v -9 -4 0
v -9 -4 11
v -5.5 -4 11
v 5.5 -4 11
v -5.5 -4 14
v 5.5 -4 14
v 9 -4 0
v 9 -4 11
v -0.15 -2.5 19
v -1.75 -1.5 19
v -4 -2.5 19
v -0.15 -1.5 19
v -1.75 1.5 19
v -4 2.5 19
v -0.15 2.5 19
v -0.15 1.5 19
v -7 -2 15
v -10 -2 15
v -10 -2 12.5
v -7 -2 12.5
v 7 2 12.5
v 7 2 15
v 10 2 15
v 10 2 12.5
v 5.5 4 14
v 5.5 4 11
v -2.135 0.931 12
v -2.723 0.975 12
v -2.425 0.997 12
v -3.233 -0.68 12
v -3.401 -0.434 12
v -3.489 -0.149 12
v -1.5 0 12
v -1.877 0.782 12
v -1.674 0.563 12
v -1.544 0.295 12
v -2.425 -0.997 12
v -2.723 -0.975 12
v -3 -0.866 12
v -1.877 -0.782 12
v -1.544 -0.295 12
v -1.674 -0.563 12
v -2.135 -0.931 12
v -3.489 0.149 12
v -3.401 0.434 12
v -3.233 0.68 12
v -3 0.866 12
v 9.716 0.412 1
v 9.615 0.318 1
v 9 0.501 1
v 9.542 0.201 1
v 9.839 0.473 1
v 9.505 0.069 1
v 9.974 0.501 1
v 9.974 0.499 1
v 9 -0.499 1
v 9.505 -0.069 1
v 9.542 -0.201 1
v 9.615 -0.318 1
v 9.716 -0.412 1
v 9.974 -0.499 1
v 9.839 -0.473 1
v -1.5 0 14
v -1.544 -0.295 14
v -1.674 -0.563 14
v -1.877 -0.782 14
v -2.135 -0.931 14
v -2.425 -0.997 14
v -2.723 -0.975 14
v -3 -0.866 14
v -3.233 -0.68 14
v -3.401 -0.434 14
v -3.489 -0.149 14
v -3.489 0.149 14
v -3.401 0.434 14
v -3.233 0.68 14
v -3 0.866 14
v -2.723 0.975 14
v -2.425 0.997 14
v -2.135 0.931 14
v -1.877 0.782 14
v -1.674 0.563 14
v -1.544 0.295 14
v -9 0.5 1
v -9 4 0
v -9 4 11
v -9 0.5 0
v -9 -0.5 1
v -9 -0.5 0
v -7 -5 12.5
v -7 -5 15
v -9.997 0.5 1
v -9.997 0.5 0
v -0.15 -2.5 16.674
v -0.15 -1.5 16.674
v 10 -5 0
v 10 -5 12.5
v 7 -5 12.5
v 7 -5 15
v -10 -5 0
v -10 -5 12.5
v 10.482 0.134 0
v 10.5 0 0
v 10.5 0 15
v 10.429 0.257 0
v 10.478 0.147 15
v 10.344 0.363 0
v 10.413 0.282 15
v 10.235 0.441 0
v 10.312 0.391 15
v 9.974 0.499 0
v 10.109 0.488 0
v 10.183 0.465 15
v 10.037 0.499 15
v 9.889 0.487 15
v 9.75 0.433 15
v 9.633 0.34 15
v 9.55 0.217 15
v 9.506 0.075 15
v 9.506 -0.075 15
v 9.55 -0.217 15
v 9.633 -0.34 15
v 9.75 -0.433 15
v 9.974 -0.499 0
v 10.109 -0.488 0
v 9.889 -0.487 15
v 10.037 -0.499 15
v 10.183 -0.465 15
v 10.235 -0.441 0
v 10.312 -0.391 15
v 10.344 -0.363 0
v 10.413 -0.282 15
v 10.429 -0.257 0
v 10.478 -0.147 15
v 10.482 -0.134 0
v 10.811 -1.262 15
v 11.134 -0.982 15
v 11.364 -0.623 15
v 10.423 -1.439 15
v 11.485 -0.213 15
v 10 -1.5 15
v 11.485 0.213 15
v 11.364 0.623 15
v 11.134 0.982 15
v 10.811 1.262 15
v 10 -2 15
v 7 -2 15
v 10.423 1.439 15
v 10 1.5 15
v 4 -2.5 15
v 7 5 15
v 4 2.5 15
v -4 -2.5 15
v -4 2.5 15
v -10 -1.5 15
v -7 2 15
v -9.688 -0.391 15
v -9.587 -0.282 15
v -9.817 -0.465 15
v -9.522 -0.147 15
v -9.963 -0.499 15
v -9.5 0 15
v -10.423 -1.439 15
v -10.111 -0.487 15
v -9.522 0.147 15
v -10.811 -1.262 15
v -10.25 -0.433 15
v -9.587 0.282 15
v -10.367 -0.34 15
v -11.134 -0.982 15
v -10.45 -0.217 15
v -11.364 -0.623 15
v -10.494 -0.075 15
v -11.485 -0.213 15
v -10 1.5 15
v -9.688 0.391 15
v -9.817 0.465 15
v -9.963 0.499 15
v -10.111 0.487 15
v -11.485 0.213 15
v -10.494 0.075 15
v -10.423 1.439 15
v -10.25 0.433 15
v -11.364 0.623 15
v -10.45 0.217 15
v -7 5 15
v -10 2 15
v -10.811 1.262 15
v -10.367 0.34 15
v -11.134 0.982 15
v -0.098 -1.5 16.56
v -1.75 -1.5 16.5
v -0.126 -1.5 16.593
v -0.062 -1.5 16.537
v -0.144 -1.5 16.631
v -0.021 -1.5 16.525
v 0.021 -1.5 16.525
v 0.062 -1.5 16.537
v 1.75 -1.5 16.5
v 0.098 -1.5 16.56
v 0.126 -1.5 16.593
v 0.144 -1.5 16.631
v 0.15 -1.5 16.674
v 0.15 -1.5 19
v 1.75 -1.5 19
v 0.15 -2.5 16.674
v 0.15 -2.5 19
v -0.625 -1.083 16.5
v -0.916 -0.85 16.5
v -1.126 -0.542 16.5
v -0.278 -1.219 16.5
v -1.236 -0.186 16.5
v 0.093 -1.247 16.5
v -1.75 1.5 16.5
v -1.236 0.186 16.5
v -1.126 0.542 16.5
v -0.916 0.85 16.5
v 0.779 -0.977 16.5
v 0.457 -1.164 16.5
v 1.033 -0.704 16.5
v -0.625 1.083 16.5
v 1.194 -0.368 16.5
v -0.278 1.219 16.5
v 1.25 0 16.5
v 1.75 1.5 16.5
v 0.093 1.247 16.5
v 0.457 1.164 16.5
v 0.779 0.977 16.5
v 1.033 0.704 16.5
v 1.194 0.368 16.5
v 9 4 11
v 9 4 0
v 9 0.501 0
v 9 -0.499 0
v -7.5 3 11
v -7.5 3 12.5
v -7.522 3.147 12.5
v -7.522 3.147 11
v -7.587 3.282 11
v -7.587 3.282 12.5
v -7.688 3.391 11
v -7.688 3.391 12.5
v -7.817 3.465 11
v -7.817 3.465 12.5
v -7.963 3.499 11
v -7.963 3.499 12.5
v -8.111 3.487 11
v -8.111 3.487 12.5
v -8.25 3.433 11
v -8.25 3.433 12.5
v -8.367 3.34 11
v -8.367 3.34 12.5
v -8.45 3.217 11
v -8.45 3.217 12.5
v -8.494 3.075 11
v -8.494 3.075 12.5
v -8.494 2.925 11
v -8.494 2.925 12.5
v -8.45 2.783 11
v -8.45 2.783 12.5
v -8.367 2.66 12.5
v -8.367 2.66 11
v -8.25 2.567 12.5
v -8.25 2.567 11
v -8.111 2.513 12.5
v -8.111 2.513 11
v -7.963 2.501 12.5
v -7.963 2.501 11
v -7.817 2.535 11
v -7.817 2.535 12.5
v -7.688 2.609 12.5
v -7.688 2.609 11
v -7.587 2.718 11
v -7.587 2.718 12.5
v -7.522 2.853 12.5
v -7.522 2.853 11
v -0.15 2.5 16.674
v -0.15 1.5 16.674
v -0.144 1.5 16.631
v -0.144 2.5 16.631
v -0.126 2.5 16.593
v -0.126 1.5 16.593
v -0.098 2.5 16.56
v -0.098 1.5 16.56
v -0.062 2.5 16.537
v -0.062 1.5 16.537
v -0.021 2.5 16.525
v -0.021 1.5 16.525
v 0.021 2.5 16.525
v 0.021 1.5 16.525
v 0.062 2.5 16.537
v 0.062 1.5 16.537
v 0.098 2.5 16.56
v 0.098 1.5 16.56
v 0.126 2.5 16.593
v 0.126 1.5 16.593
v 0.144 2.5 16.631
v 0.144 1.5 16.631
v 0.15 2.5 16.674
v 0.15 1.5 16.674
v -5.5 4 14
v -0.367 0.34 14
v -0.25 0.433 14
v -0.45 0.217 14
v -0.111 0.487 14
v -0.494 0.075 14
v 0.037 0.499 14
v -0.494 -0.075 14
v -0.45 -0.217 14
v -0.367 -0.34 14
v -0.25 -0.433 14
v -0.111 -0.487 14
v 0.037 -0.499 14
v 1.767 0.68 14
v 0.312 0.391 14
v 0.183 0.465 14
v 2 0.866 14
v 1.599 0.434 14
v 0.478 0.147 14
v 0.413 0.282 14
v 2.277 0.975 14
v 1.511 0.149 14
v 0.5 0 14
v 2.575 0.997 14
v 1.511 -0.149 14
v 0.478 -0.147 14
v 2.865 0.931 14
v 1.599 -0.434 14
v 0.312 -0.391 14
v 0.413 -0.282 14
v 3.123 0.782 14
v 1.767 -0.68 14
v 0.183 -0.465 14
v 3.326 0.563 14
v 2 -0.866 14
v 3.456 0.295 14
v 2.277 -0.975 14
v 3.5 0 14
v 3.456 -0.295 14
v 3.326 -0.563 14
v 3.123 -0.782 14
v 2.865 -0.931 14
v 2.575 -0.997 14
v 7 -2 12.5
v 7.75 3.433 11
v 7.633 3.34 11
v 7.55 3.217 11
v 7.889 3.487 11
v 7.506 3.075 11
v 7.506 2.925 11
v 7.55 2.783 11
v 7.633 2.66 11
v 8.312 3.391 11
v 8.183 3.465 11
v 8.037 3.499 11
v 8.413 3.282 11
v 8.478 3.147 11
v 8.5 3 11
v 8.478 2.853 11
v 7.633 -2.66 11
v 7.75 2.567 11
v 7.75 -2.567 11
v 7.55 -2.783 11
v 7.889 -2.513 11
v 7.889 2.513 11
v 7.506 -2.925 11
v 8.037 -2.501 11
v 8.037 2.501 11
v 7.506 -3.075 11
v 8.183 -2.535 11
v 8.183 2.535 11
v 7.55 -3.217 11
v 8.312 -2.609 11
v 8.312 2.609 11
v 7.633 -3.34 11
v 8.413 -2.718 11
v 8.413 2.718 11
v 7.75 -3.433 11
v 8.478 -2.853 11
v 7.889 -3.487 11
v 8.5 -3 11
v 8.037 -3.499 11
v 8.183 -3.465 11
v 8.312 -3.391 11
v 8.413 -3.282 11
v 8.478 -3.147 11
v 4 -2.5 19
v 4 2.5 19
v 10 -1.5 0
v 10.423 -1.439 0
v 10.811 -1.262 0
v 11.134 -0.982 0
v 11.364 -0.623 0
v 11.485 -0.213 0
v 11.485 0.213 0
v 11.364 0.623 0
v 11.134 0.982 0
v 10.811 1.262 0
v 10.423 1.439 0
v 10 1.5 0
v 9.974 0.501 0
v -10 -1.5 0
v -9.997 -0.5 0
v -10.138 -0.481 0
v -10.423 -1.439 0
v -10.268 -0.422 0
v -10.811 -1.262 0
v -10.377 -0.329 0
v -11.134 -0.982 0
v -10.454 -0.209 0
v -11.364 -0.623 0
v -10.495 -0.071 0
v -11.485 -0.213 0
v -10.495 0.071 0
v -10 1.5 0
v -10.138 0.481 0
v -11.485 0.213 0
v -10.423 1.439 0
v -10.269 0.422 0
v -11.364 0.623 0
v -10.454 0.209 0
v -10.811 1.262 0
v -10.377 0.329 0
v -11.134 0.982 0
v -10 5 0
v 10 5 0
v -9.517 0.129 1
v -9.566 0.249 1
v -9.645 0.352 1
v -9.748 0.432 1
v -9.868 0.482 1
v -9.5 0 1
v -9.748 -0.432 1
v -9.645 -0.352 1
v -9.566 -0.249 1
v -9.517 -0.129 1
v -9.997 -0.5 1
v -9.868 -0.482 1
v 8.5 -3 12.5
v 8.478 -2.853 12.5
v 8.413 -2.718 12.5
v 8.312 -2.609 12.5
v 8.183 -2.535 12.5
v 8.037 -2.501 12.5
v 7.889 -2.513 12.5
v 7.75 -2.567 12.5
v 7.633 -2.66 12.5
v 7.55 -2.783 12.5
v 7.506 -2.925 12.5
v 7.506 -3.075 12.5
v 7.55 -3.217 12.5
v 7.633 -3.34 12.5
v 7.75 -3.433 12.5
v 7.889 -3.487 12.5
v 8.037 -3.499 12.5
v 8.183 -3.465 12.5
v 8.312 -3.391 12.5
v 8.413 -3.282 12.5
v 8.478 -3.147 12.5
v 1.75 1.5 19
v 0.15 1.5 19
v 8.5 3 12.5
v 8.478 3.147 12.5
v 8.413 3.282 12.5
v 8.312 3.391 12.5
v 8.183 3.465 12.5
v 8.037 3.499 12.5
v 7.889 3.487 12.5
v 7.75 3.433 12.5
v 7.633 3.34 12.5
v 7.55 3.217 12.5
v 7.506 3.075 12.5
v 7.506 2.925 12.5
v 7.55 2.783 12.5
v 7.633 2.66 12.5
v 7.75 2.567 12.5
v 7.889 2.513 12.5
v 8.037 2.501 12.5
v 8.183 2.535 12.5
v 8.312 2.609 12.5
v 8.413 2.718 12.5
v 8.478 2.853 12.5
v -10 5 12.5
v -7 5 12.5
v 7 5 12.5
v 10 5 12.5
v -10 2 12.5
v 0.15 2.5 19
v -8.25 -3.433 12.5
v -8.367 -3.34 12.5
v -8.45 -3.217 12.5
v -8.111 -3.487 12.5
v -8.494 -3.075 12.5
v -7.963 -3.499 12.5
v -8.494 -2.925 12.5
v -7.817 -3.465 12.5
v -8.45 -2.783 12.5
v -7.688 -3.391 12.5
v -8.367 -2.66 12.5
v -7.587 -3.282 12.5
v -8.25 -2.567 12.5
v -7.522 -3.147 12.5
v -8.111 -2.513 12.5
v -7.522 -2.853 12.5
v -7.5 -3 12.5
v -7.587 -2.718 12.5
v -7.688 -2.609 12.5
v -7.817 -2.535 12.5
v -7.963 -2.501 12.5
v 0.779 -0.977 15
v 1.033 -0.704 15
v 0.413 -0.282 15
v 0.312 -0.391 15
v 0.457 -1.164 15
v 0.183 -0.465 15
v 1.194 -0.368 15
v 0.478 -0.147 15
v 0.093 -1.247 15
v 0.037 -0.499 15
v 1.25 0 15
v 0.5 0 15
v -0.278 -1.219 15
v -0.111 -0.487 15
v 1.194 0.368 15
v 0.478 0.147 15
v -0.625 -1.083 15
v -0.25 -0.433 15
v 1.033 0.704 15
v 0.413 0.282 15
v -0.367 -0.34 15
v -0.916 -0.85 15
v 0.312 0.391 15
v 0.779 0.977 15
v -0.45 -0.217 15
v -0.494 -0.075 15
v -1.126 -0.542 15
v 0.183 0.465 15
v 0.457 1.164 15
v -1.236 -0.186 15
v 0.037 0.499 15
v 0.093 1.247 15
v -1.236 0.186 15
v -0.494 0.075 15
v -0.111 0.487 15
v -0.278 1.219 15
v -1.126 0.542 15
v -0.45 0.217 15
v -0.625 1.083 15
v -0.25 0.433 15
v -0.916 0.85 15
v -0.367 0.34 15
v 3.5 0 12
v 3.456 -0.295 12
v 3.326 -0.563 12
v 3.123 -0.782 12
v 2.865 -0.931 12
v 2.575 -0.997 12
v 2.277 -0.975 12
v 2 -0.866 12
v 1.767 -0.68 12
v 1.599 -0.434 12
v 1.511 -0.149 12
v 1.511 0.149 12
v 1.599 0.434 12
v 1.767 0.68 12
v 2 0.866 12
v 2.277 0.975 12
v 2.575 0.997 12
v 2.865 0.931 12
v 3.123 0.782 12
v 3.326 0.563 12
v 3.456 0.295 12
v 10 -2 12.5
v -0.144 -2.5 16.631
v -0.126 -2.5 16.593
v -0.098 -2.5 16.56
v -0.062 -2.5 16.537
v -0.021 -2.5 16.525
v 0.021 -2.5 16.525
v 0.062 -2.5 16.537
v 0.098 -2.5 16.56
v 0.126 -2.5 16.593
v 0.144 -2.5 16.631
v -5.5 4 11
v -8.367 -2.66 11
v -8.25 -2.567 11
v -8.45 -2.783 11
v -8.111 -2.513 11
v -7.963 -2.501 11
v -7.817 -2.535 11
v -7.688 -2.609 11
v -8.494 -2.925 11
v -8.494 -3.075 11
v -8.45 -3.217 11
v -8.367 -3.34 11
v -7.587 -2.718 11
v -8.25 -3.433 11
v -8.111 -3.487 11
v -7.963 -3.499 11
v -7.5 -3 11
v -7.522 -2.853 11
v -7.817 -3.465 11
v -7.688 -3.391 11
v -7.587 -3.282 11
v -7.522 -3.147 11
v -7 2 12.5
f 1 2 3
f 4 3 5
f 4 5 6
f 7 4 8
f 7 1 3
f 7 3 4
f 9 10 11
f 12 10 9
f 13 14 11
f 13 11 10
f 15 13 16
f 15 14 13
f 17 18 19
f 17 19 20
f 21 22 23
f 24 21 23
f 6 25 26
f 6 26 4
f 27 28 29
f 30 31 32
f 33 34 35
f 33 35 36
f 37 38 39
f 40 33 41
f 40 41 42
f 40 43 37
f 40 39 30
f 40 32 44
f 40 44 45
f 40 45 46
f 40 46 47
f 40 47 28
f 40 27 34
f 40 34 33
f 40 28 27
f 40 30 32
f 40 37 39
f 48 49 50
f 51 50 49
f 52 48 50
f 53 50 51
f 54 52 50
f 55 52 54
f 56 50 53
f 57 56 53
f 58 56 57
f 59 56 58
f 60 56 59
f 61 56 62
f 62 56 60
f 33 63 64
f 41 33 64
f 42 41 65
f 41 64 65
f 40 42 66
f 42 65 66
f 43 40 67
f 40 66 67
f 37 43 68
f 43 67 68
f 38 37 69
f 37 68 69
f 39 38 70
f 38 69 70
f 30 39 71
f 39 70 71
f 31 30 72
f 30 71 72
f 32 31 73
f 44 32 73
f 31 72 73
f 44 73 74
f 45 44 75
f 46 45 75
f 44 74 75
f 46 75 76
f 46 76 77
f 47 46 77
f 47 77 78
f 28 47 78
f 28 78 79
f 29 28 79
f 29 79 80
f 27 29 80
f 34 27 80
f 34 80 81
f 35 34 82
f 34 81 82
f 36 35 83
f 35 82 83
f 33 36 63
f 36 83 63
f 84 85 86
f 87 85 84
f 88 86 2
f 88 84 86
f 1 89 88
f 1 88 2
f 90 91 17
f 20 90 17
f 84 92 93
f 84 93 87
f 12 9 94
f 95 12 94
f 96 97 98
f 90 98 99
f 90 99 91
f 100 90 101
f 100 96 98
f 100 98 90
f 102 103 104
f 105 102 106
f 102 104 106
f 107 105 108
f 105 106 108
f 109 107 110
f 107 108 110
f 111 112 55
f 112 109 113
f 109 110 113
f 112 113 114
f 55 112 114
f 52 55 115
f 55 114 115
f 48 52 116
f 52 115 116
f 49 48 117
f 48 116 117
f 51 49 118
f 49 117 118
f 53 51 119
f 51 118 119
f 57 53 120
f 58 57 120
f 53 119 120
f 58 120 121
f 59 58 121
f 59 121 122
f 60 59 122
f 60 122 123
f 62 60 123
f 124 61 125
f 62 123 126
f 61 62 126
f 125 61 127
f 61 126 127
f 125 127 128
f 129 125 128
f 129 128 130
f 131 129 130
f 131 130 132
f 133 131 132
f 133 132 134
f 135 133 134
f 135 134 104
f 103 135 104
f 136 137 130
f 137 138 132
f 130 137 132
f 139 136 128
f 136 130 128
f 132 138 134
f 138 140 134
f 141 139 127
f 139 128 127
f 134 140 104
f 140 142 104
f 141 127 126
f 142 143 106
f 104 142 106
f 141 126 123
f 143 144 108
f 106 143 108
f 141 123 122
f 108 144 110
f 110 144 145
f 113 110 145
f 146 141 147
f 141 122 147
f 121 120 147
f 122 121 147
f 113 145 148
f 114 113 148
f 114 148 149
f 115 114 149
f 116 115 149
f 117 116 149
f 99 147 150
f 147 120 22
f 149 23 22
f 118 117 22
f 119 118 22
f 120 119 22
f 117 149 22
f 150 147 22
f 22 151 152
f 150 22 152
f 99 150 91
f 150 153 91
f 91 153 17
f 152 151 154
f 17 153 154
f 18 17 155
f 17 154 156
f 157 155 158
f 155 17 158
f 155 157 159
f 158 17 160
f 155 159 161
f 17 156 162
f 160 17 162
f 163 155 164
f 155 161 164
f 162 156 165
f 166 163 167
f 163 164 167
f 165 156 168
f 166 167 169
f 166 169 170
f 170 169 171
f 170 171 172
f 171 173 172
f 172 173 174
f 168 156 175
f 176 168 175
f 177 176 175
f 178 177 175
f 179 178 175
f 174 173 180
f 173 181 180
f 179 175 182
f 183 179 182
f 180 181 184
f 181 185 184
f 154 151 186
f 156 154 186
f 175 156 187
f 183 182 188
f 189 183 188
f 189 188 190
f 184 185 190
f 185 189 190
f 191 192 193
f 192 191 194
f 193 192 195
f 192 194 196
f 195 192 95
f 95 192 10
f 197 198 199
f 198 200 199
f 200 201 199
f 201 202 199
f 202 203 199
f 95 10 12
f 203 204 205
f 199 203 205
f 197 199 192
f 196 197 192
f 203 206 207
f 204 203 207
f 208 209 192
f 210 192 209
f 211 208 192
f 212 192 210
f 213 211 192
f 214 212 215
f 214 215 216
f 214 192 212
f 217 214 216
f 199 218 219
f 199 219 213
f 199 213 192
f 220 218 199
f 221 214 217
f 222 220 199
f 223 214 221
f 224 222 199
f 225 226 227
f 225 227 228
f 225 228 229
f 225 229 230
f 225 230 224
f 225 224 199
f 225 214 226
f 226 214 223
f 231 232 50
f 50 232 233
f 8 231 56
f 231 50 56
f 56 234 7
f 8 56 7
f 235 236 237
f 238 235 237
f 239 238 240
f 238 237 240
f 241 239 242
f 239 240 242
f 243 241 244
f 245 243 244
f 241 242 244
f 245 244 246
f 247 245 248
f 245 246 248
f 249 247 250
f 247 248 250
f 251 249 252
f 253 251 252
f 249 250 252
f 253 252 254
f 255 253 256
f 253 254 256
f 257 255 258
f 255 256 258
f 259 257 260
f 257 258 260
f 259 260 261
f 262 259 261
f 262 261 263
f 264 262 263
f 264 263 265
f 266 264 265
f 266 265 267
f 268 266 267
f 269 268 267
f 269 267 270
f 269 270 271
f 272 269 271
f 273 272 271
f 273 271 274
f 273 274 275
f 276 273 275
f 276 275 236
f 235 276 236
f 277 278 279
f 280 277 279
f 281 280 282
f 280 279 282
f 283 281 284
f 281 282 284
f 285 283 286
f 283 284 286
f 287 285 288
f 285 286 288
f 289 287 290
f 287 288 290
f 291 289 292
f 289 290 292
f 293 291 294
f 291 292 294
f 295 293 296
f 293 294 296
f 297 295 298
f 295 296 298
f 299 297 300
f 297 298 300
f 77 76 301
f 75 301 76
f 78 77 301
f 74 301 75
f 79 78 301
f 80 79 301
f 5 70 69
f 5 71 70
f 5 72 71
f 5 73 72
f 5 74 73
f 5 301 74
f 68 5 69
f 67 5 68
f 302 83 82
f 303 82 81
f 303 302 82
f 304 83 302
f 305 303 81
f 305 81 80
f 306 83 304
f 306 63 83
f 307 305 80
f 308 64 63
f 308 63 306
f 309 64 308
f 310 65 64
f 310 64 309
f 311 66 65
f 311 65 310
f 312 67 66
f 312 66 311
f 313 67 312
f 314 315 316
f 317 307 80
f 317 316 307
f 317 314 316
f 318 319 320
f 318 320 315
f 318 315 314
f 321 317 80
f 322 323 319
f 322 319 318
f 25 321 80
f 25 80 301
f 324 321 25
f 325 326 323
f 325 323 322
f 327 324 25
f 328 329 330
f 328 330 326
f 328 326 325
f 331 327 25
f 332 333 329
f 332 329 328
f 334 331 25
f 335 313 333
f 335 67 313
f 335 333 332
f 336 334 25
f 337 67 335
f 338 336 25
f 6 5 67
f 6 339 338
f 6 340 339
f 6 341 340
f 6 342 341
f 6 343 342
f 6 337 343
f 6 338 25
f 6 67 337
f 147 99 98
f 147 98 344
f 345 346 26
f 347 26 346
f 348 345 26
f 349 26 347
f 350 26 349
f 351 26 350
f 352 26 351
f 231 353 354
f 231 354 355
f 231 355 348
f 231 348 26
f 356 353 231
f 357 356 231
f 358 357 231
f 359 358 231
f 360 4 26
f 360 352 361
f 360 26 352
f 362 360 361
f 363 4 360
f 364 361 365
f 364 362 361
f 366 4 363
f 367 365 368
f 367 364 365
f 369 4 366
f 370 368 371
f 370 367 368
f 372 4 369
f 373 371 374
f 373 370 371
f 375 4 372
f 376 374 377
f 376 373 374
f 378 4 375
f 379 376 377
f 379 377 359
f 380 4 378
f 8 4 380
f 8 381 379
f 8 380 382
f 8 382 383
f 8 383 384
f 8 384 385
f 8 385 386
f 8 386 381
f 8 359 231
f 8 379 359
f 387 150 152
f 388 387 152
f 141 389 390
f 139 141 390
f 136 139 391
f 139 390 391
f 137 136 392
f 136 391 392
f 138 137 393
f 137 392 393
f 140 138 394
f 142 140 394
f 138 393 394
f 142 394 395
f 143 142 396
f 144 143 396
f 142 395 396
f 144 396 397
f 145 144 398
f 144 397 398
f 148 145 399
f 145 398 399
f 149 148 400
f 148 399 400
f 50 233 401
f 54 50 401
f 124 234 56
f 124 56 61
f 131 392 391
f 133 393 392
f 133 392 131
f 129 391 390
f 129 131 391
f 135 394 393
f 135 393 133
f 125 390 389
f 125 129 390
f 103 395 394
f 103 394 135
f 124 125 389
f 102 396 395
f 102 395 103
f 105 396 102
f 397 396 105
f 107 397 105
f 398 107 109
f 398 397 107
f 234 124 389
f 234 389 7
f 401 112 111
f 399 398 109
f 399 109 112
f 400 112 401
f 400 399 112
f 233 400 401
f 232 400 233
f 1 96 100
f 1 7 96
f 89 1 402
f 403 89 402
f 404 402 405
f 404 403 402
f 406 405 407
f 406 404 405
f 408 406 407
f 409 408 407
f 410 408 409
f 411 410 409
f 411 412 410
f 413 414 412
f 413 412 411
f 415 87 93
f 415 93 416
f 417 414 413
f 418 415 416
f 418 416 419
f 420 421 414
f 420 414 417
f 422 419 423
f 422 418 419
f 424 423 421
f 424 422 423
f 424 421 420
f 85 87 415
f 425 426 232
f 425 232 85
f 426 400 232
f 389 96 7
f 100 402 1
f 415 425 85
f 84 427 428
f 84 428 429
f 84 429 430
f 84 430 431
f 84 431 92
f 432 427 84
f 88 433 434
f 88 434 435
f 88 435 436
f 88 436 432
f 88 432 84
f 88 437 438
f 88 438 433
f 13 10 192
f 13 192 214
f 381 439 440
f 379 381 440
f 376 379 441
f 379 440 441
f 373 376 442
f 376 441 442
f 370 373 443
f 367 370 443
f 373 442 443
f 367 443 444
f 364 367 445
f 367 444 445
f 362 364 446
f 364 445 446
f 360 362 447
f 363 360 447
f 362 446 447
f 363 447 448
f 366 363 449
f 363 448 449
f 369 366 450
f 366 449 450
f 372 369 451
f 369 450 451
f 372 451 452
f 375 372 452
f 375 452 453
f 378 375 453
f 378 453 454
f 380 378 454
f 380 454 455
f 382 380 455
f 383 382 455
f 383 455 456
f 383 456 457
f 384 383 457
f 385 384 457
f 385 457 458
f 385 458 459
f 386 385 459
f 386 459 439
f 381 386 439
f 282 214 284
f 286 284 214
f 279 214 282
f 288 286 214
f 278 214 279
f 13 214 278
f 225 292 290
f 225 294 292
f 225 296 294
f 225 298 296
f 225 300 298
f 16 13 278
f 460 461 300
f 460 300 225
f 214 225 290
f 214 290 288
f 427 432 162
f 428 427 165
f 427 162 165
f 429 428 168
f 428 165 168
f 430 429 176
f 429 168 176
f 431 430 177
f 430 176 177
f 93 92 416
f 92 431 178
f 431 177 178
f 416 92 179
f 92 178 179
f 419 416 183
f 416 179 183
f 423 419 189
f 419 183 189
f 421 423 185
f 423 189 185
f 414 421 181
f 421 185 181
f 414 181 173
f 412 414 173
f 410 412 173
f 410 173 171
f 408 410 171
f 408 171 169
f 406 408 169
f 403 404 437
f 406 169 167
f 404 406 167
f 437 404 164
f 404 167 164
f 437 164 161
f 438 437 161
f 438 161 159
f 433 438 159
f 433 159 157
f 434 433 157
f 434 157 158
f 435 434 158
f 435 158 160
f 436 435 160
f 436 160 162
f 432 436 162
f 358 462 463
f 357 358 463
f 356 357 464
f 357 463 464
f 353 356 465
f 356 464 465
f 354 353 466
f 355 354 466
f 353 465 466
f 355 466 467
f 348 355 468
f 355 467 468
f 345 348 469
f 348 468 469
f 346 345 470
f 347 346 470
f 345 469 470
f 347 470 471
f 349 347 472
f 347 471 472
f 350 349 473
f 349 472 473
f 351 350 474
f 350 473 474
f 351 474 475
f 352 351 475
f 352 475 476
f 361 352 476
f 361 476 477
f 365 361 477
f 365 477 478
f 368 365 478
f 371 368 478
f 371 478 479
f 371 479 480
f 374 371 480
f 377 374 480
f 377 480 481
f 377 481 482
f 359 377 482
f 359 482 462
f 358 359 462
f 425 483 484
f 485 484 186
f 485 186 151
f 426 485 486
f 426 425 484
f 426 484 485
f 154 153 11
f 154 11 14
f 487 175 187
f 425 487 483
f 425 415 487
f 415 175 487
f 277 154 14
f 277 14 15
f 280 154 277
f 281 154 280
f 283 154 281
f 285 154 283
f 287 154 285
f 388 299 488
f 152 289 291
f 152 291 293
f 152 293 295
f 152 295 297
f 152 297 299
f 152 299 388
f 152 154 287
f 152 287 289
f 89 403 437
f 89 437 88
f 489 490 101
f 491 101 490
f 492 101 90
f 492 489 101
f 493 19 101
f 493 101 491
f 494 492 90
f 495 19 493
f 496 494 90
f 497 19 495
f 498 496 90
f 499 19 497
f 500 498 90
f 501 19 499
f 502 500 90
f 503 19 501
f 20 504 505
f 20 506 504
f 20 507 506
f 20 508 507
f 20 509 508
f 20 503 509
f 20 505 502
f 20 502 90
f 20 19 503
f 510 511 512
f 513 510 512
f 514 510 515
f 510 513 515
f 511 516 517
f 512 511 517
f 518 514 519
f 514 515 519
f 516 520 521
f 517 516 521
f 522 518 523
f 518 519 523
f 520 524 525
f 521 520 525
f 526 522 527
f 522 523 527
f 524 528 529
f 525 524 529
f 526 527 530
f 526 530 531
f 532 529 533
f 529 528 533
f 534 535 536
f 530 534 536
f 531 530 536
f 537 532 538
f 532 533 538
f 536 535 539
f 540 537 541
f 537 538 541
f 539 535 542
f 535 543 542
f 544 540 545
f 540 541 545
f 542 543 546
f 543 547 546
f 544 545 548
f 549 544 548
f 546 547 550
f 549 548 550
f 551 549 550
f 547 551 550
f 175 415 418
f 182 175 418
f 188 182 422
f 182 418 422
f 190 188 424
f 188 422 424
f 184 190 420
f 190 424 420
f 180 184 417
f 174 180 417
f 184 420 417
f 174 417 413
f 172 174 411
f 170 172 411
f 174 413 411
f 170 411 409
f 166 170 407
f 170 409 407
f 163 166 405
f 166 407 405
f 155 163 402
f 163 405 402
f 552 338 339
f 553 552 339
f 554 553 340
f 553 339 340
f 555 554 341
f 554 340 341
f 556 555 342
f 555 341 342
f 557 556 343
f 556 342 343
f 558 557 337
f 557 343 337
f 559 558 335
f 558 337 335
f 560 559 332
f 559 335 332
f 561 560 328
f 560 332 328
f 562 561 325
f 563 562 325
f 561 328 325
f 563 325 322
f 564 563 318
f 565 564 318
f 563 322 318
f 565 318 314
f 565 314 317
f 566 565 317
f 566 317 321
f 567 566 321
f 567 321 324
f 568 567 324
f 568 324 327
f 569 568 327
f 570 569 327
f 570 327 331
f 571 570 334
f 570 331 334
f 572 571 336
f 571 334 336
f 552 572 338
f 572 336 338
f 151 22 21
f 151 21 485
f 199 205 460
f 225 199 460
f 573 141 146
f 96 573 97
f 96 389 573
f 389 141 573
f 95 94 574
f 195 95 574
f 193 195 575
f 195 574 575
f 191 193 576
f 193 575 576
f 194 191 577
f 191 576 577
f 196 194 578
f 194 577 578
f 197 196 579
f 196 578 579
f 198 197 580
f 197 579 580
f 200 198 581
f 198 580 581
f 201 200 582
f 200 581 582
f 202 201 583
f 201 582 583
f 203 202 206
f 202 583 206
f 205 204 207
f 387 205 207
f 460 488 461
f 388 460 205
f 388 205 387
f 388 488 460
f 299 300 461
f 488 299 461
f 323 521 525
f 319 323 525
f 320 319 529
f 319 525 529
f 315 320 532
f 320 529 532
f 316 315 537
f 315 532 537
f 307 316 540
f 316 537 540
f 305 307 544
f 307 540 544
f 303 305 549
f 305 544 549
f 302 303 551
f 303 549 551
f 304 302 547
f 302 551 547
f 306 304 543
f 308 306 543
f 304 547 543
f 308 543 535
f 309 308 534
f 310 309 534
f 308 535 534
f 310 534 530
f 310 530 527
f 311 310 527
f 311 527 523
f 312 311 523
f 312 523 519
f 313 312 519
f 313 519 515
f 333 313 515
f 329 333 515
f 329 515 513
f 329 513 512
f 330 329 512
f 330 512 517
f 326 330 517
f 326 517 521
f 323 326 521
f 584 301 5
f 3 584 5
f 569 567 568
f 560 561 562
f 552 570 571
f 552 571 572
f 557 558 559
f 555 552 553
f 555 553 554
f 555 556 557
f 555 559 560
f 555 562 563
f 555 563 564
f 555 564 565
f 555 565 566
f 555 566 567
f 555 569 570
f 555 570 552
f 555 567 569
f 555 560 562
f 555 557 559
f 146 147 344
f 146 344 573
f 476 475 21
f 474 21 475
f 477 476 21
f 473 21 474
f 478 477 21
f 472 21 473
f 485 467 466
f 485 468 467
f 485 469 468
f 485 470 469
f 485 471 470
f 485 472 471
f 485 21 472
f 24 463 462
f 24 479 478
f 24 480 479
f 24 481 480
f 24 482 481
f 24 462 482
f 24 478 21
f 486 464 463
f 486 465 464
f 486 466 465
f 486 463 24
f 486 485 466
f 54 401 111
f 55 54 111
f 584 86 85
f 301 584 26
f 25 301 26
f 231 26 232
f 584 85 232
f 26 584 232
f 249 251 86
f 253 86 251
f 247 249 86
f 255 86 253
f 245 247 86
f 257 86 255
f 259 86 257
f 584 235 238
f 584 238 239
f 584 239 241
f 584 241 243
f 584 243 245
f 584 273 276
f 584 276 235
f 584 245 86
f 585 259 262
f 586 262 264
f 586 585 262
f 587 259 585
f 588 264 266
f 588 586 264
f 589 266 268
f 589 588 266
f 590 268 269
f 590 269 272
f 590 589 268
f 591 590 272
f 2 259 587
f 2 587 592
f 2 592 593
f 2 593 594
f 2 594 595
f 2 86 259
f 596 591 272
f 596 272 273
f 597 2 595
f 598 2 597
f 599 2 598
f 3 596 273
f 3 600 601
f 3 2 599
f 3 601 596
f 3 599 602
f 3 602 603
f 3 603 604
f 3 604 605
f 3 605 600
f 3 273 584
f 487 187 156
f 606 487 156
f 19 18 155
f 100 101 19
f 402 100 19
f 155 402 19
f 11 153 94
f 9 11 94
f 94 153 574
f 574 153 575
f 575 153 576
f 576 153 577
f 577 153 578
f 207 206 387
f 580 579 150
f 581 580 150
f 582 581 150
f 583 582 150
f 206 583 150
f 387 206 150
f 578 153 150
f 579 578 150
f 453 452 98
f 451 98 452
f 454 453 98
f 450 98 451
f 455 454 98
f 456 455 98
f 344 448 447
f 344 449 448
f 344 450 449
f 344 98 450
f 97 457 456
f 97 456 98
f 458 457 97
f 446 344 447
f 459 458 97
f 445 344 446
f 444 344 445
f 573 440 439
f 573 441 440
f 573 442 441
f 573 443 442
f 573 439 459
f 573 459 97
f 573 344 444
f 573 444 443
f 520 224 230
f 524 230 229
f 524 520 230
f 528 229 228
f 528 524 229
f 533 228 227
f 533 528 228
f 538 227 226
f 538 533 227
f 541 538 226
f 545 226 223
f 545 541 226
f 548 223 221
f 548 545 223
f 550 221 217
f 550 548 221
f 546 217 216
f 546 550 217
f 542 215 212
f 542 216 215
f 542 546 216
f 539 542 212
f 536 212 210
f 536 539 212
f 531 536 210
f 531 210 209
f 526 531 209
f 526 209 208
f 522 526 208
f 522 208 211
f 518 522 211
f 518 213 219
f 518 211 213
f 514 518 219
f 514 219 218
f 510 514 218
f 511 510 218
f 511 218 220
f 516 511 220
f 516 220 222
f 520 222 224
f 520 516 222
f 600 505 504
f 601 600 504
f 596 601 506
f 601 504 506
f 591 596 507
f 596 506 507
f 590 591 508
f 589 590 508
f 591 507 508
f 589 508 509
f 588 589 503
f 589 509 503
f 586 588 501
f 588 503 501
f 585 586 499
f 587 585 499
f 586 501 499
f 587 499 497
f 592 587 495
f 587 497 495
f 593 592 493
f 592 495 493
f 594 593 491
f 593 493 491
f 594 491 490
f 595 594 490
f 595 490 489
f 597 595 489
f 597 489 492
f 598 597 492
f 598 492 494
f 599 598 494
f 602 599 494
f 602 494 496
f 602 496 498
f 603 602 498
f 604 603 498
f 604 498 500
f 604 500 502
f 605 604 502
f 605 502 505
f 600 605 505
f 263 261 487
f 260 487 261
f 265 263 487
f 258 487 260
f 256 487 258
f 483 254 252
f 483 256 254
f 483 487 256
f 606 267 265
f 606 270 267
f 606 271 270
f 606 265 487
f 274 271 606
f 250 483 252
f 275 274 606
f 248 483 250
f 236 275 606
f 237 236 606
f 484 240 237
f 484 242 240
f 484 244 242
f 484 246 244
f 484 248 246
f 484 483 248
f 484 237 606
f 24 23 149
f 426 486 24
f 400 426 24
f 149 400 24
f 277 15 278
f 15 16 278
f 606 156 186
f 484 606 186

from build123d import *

# Parameters (mm, degrees)
PAD_DEPTH       = 15
SKETCH001_W     = 18
SKETCH001_H     = 8
POCKET_DEPTH    = 14
SKETCH002_R     = 1
PAD001_DEPTH    = 2
SKETCH003_R     = 0.5
POCKET001_DEPTH = 15.001
SKETCH004_W     = 8
SKETCH004_H     = 5
SKETCH004_R     = 1.25
PAD002_DEPTH    = 4
SKETCH005_W     = 3.5
SKETCH005_H     = 3
POCKET002_DEPTH = 2.5
POCKET003_DEPTH = 7.501
SKETCH007_W     = 3.5
SKETCH007_H     = 8
PAD003_DEPTH    = 3
SKETCH008_W     = 3
SKETCH008_H     = 3
POCKET004_DEPTH = 2.5
SKETCH010_R     = 0.5
POCKET005_DEPTH = 12.501
SKETCH011_R     = 0.5
POCKET006_DEPTH = 15.001
SKETCH012_W     = 1.058742
SKETCH012_H     = 1
SKETCH012_W_2   = 1.116308
POCKET007_DEPTH = 1


with BuildPart() as part:
    # Sketch → Pad (new body)
    with BuildSketch(Plane.XY):
        with BuildLine():
            Line((-10, 5), (10, 5))
            Line((10, 5), (10, 1.5))
            ThreePointArc((10, -1.5), (11.5, 0), (10, 1.5))
            Line((10, -1.5), (10, -5))
            Line((10, -5), (-10, -5))
            Line((-10, -5), (-10, -1.5))
            ThreePointArc((-10, 1.5), (-11.5, 0), (-10, -1.5))
            Line((-10, 1.5), (-10, 5))
        make_face()
    extrude(amount=PAD_DEPTH)

    # Sketch001 (on Face9 of Pad) → Pocket (cut)
    with BuildSketch(Plane(origin=(0, 0, 0), x_dir=(1, 0, 0), z_dir=(0, 0, -1))):
        Rectangle(SKETCH001_W, SKETCH001_H)
    extrude(amount=-POCKET_DEPTH, mode=Mode.SUBTRACT)

    # Sketch002 (on Face15 of Pocket) → Pad001 (join)
    with BuildSketch(Plane(origin=(0, 0, 14), x_dir=(1, 0, 0), z_dir=(0, 0, -1))):
        with Locations((-2.5, 0)):
            Circle(SKETCH002_R)
        with Locations((2.5, 0)):
            Circle(SKETCH002_R)
    extrude(amount=PAD001_DEPTH)

    # Sketch003 (on Face5 of Pad001) → Pocket001 (cut, through all)
    with BuildSketch(Plane.XY.offset(15)):
        Circle(SKETCH003_R)
    extrude(amount=-POCKET001_DEPTH, mode=Mode.SUBTRACT)

    # Sketch004 (on Face5 of Pocket001) → Pad002 (join)
    with BuildSketch(Plane.XY.offset(15)):
        Rectangle(SKETCH004_W, SKETCH004_H)
        Circle(SKETCH004_R, mode=Mode.SUBTRACT)
    extrude(amount=PAD002_DEPTH)

    # Sketch005 (on Face20 of Pad002) → Pocket002 (cut)
    with BuildSketch(Plane.XY.offset(19)):
        Rectangle(SKETCH005_W, SKETCH005_H)
    extrude(amount=-POCKET002_DEPTH, mode=Mode.SUBTRACT)

    # Sketch006 (on Face16 of Pocket002) → Pocket003 (cut, through all)
    with BuildSketch(Plane.XZ.offset(2.5)):
        with BuildLine():
            ThreePointArc((0.15, 19.022961), (0, 19.172961), (-0.15, 19.022961))
            Line((-0.15, 19.022961), (-0.15, 16.673611))
            ThreePointArc((-0.15, 16.673611), (0, 16.523611), (0.15, 16.673611))
            Line((0.15, 16.673611), (0.15, 19.022961))
        make_face()
    extrude(amount=-POCKET003_DEPTH, mode=Mode.SUBTRACT)

    # Sketch007 (on Face19 of Pocket003) → Pad003 (join)
    with BuildSketch(Plane(origin=(0, 0, 14), x_dir=(1, 0, 0), z_dir=(0, 0, -1))):
        with Locations((7.25, 0)):
            Rectangle(SKETCH007_W, SKETCH007_H)
        with Locations((-7.25, 0)):
            Rectangle(SKETCH007_W, SKETCH007_H)
    extrude(amount=PAD003_DEPTH)

    # Sketch008 (on Face5 of Pad003) → Pocket004 (cut)
    with BuildSketch(Plane.XY.offset(15)):
        with Locations((8.5, -3.5)):
            Rectangle(SKETCH008_W, SKETCH008_H)
        with Locations((8.5, 3.5)):
            Rectangle(SKETCH008_W, SKETCH008_H)
        with Locations((-8.5, -3.5)):
            Rectangle(SKETCH008_W, SKETCH008_H)
        with Locations((-8.5, 3.5)):
            Rectangle(SKETCH008_W, SKETCH008_H)
    extrude(amount=-POCKET004_DEPTH, mode=Mode.SUBTRACT)

    # Sketch010 → Pocket005 (cut, through all)
    with BuildSketch(Plane.XY.offset(12.5)):
        with Locations((8, -3)):
            Circle(SKETCH010_R)
        with Locations((8, 3)):
            Circle(SKETCH010_R)
        with Locations((-8, 3)):
            Circle(SKETCH010_R)
        with Locations((-8, -3)):
            Circle(SKETCH010_R)
    extrude(amount=-POCKET005_DEPTH, mode=Mode.SUBTRACT)

    # Sketch011 (on Face6 of Pocket005) → Pocket006 (cut, through all)
    with BuildSketch(Plane.XY.offset(15)):
        with Locations((-10, 0)):
            Circle(SKETCH011_R)
        with Locations((10, 0)):
            Circle(SKETCH011_R)
    extrude(amount=-POCKET006_DEPTH, mode=Mode.SUBTRACT)

    # Sketch012 (on Face2 of Pocket006) → Pocket007 (cut)
    with BuildSketch(Plane(origin=(0, 0, 0), x_dir=(1, 0, 0), z_dir=(0, 0, -1))):
        with Locations((-9.46722, -1.2e-05)):
            Rectangle(SKETCH012_W, SKETCH012_H)
        with Locations((9.416079, -0.000664)):
            Rectangle(SKETCH012_W_2, SKETCH012_H)
    extrude(amount=-POCKET007_DEPTH, mode=Mode.SUBTRACT)


solid = part.part
